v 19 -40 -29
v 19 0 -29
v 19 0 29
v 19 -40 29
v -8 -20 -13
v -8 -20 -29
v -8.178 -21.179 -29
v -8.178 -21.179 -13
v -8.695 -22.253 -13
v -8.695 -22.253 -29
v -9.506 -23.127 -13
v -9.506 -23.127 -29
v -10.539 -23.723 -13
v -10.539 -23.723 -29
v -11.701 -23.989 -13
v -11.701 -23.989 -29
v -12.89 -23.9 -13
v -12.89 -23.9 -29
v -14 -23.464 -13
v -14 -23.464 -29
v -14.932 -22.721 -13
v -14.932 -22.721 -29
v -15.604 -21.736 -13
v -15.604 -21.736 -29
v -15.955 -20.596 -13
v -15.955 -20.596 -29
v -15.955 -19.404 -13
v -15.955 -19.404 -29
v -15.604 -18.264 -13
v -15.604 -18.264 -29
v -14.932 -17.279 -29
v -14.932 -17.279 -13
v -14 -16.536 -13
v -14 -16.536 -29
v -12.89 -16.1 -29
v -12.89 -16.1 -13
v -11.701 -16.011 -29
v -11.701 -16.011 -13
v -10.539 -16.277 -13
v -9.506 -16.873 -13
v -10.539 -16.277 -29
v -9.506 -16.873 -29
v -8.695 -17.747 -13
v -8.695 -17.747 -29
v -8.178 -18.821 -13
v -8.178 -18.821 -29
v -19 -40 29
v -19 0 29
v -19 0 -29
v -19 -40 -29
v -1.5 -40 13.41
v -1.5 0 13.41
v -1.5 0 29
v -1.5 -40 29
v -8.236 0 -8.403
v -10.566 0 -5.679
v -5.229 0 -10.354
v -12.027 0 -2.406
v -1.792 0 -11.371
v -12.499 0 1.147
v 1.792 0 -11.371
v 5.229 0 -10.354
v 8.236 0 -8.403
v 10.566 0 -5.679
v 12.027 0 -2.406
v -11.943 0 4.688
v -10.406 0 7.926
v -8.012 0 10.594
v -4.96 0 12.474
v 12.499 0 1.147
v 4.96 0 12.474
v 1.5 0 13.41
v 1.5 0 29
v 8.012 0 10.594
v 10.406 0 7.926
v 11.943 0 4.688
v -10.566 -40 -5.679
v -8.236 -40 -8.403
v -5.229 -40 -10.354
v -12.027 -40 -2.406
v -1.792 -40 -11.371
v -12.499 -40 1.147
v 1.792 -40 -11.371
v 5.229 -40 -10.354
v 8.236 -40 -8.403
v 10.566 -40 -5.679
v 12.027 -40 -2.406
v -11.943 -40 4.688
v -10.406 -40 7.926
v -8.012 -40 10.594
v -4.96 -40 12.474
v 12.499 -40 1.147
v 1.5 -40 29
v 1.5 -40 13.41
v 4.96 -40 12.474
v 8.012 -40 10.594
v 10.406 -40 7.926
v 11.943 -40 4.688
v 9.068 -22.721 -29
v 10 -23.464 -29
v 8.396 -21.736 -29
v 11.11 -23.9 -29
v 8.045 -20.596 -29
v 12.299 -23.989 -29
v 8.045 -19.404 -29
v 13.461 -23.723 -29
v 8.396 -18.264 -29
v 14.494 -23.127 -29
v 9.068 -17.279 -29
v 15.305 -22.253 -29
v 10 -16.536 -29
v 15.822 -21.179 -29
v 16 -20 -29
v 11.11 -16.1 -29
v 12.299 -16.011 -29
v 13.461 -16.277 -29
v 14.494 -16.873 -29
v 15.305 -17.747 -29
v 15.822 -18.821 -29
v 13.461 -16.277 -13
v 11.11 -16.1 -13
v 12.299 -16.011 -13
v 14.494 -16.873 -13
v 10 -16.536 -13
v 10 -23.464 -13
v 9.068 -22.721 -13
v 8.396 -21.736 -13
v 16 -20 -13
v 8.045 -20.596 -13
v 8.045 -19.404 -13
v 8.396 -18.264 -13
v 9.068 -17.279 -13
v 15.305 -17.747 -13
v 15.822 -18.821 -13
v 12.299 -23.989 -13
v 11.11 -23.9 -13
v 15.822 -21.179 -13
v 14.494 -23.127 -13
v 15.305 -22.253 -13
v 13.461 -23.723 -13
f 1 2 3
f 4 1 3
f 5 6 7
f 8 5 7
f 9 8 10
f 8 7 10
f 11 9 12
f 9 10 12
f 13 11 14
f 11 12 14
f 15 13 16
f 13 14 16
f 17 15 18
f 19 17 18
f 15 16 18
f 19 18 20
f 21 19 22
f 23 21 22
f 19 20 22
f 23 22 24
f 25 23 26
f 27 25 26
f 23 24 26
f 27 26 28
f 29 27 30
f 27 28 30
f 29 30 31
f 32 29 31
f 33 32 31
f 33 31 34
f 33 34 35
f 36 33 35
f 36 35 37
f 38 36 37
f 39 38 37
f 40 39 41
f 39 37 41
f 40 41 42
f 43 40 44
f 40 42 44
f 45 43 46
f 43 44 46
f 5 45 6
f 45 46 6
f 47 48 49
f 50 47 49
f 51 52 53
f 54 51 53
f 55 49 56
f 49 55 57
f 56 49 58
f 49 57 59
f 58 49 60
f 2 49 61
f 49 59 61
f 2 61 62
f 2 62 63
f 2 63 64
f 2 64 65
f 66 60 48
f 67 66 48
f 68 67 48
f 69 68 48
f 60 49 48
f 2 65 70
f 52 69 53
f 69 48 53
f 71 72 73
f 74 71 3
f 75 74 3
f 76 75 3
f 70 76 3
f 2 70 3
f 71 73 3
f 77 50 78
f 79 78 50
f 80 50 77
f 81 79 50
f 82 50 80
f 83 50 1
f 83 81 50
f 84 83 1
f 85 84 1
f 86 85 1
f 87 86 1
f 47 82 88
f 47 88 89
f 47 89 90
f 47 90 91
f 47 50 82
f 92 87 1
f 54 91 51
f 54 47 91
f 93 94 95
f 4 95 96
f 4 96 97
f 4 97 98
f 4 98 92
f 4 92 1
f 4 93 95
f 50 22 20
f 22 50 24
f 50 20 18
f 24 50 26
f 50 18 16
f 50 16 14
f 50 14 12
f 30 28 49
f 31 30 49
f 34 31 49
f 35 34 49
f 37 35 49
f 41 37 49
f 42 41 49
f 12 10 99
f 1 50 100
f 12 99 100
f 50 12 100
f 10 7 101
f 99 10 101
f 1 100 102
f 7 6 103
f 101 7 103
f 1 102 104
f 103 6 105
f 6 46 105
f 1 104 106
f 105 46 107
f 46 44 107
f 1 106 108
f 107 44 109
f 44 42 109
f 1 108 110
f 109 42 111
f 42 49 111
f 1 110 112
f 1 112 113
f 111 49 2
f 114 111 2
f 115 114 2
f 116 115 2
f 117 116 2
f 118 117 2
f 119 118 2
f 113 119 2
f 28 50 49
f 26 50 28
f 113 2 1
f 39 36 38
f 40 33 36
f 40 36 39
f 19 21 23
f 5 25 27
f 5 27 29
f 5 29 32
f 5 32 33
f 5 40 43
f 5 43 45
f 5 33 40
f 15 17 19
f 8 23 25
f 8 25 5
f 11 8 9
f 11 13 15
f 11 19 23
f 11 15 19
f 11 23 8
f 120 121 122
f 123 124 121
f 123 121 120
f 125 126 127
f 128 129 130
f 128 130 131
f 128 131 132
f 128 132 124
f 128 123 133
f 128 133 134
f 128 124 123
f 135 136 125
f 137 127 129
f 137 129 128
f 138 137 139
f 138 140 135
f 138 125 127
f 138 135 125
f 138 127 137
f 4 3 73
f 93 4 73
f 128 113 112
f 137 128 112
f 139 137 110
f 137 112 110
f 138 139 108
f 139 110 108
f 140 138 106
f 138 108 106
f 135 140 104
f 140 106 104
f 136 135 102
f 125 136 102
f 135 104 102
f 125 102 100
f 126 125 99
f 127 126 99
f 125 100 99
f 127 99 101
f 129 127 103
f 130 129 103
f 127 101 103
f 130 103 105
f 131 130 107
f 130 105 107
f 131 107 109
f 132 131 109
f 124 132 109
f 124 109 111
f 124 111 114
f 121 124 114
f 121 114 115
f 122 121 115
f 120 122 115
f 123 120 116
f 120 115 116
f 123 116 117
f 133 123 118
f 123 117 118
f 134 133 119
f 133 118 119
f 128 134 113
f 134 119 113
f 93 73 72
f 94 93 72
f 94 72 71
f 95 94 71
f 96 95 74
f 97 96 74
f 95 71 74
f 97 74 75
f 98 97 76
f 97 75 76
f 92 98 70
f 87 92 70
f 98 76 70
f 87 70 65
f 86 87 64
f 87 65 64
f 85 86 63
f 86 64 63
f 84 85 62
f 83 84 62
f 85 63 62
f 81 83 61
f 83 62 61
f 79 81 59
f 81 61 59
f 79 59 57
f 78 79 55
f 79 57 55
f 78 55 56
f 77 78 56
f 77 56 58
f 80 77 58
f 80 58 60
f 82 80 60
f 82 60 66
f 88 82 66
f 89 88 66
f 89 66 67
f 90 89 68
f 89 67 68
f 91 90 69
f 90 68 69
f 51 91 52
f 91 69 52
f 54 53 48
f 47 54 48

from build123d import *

# Parameters (mm, degrees)
F1_DEPTH = 40
F2_R     = 4
F3_DEPTH = 16


with BuildPart() as f1:
    # F0 (on Front) → F1 (new body)
    with BuildSketch(Plane.XZ):
        with BuildLine():
            Line((19, -29), (19, 29))
            Line((19, 29), (1.5, 29))
            Line((1.5, 29), (1.5, 13.409674))
            ThreePointArc((1.5, 13.409674), (0, -11.5), (-1.5, 13.409674))
            Line((-1.5, 13.409674), (-1.5, 29))
            Line((-1.5, 29), (-19, 29))
            Line((-19, 29), (-19, -29))
            Line((-19, -29), (19, -29))
        make_face()
    extrude(amount=F1_DEPTH)

    # F2 (on face) → F3 (cut)
    with BuildSketch(Plane(origin=(0, 0, -29), x_dir=(1, 0, 0), z_dir=(0, 0, -1))):
        with Locations((-12, 20)):
            Circle(F2_R)
        with Locations((12, 20)):
            Circle(F2_R)
    extrude(amount=-F3_DEPTH, mode=Mode.SUBTRACT)


solid = f1.part
